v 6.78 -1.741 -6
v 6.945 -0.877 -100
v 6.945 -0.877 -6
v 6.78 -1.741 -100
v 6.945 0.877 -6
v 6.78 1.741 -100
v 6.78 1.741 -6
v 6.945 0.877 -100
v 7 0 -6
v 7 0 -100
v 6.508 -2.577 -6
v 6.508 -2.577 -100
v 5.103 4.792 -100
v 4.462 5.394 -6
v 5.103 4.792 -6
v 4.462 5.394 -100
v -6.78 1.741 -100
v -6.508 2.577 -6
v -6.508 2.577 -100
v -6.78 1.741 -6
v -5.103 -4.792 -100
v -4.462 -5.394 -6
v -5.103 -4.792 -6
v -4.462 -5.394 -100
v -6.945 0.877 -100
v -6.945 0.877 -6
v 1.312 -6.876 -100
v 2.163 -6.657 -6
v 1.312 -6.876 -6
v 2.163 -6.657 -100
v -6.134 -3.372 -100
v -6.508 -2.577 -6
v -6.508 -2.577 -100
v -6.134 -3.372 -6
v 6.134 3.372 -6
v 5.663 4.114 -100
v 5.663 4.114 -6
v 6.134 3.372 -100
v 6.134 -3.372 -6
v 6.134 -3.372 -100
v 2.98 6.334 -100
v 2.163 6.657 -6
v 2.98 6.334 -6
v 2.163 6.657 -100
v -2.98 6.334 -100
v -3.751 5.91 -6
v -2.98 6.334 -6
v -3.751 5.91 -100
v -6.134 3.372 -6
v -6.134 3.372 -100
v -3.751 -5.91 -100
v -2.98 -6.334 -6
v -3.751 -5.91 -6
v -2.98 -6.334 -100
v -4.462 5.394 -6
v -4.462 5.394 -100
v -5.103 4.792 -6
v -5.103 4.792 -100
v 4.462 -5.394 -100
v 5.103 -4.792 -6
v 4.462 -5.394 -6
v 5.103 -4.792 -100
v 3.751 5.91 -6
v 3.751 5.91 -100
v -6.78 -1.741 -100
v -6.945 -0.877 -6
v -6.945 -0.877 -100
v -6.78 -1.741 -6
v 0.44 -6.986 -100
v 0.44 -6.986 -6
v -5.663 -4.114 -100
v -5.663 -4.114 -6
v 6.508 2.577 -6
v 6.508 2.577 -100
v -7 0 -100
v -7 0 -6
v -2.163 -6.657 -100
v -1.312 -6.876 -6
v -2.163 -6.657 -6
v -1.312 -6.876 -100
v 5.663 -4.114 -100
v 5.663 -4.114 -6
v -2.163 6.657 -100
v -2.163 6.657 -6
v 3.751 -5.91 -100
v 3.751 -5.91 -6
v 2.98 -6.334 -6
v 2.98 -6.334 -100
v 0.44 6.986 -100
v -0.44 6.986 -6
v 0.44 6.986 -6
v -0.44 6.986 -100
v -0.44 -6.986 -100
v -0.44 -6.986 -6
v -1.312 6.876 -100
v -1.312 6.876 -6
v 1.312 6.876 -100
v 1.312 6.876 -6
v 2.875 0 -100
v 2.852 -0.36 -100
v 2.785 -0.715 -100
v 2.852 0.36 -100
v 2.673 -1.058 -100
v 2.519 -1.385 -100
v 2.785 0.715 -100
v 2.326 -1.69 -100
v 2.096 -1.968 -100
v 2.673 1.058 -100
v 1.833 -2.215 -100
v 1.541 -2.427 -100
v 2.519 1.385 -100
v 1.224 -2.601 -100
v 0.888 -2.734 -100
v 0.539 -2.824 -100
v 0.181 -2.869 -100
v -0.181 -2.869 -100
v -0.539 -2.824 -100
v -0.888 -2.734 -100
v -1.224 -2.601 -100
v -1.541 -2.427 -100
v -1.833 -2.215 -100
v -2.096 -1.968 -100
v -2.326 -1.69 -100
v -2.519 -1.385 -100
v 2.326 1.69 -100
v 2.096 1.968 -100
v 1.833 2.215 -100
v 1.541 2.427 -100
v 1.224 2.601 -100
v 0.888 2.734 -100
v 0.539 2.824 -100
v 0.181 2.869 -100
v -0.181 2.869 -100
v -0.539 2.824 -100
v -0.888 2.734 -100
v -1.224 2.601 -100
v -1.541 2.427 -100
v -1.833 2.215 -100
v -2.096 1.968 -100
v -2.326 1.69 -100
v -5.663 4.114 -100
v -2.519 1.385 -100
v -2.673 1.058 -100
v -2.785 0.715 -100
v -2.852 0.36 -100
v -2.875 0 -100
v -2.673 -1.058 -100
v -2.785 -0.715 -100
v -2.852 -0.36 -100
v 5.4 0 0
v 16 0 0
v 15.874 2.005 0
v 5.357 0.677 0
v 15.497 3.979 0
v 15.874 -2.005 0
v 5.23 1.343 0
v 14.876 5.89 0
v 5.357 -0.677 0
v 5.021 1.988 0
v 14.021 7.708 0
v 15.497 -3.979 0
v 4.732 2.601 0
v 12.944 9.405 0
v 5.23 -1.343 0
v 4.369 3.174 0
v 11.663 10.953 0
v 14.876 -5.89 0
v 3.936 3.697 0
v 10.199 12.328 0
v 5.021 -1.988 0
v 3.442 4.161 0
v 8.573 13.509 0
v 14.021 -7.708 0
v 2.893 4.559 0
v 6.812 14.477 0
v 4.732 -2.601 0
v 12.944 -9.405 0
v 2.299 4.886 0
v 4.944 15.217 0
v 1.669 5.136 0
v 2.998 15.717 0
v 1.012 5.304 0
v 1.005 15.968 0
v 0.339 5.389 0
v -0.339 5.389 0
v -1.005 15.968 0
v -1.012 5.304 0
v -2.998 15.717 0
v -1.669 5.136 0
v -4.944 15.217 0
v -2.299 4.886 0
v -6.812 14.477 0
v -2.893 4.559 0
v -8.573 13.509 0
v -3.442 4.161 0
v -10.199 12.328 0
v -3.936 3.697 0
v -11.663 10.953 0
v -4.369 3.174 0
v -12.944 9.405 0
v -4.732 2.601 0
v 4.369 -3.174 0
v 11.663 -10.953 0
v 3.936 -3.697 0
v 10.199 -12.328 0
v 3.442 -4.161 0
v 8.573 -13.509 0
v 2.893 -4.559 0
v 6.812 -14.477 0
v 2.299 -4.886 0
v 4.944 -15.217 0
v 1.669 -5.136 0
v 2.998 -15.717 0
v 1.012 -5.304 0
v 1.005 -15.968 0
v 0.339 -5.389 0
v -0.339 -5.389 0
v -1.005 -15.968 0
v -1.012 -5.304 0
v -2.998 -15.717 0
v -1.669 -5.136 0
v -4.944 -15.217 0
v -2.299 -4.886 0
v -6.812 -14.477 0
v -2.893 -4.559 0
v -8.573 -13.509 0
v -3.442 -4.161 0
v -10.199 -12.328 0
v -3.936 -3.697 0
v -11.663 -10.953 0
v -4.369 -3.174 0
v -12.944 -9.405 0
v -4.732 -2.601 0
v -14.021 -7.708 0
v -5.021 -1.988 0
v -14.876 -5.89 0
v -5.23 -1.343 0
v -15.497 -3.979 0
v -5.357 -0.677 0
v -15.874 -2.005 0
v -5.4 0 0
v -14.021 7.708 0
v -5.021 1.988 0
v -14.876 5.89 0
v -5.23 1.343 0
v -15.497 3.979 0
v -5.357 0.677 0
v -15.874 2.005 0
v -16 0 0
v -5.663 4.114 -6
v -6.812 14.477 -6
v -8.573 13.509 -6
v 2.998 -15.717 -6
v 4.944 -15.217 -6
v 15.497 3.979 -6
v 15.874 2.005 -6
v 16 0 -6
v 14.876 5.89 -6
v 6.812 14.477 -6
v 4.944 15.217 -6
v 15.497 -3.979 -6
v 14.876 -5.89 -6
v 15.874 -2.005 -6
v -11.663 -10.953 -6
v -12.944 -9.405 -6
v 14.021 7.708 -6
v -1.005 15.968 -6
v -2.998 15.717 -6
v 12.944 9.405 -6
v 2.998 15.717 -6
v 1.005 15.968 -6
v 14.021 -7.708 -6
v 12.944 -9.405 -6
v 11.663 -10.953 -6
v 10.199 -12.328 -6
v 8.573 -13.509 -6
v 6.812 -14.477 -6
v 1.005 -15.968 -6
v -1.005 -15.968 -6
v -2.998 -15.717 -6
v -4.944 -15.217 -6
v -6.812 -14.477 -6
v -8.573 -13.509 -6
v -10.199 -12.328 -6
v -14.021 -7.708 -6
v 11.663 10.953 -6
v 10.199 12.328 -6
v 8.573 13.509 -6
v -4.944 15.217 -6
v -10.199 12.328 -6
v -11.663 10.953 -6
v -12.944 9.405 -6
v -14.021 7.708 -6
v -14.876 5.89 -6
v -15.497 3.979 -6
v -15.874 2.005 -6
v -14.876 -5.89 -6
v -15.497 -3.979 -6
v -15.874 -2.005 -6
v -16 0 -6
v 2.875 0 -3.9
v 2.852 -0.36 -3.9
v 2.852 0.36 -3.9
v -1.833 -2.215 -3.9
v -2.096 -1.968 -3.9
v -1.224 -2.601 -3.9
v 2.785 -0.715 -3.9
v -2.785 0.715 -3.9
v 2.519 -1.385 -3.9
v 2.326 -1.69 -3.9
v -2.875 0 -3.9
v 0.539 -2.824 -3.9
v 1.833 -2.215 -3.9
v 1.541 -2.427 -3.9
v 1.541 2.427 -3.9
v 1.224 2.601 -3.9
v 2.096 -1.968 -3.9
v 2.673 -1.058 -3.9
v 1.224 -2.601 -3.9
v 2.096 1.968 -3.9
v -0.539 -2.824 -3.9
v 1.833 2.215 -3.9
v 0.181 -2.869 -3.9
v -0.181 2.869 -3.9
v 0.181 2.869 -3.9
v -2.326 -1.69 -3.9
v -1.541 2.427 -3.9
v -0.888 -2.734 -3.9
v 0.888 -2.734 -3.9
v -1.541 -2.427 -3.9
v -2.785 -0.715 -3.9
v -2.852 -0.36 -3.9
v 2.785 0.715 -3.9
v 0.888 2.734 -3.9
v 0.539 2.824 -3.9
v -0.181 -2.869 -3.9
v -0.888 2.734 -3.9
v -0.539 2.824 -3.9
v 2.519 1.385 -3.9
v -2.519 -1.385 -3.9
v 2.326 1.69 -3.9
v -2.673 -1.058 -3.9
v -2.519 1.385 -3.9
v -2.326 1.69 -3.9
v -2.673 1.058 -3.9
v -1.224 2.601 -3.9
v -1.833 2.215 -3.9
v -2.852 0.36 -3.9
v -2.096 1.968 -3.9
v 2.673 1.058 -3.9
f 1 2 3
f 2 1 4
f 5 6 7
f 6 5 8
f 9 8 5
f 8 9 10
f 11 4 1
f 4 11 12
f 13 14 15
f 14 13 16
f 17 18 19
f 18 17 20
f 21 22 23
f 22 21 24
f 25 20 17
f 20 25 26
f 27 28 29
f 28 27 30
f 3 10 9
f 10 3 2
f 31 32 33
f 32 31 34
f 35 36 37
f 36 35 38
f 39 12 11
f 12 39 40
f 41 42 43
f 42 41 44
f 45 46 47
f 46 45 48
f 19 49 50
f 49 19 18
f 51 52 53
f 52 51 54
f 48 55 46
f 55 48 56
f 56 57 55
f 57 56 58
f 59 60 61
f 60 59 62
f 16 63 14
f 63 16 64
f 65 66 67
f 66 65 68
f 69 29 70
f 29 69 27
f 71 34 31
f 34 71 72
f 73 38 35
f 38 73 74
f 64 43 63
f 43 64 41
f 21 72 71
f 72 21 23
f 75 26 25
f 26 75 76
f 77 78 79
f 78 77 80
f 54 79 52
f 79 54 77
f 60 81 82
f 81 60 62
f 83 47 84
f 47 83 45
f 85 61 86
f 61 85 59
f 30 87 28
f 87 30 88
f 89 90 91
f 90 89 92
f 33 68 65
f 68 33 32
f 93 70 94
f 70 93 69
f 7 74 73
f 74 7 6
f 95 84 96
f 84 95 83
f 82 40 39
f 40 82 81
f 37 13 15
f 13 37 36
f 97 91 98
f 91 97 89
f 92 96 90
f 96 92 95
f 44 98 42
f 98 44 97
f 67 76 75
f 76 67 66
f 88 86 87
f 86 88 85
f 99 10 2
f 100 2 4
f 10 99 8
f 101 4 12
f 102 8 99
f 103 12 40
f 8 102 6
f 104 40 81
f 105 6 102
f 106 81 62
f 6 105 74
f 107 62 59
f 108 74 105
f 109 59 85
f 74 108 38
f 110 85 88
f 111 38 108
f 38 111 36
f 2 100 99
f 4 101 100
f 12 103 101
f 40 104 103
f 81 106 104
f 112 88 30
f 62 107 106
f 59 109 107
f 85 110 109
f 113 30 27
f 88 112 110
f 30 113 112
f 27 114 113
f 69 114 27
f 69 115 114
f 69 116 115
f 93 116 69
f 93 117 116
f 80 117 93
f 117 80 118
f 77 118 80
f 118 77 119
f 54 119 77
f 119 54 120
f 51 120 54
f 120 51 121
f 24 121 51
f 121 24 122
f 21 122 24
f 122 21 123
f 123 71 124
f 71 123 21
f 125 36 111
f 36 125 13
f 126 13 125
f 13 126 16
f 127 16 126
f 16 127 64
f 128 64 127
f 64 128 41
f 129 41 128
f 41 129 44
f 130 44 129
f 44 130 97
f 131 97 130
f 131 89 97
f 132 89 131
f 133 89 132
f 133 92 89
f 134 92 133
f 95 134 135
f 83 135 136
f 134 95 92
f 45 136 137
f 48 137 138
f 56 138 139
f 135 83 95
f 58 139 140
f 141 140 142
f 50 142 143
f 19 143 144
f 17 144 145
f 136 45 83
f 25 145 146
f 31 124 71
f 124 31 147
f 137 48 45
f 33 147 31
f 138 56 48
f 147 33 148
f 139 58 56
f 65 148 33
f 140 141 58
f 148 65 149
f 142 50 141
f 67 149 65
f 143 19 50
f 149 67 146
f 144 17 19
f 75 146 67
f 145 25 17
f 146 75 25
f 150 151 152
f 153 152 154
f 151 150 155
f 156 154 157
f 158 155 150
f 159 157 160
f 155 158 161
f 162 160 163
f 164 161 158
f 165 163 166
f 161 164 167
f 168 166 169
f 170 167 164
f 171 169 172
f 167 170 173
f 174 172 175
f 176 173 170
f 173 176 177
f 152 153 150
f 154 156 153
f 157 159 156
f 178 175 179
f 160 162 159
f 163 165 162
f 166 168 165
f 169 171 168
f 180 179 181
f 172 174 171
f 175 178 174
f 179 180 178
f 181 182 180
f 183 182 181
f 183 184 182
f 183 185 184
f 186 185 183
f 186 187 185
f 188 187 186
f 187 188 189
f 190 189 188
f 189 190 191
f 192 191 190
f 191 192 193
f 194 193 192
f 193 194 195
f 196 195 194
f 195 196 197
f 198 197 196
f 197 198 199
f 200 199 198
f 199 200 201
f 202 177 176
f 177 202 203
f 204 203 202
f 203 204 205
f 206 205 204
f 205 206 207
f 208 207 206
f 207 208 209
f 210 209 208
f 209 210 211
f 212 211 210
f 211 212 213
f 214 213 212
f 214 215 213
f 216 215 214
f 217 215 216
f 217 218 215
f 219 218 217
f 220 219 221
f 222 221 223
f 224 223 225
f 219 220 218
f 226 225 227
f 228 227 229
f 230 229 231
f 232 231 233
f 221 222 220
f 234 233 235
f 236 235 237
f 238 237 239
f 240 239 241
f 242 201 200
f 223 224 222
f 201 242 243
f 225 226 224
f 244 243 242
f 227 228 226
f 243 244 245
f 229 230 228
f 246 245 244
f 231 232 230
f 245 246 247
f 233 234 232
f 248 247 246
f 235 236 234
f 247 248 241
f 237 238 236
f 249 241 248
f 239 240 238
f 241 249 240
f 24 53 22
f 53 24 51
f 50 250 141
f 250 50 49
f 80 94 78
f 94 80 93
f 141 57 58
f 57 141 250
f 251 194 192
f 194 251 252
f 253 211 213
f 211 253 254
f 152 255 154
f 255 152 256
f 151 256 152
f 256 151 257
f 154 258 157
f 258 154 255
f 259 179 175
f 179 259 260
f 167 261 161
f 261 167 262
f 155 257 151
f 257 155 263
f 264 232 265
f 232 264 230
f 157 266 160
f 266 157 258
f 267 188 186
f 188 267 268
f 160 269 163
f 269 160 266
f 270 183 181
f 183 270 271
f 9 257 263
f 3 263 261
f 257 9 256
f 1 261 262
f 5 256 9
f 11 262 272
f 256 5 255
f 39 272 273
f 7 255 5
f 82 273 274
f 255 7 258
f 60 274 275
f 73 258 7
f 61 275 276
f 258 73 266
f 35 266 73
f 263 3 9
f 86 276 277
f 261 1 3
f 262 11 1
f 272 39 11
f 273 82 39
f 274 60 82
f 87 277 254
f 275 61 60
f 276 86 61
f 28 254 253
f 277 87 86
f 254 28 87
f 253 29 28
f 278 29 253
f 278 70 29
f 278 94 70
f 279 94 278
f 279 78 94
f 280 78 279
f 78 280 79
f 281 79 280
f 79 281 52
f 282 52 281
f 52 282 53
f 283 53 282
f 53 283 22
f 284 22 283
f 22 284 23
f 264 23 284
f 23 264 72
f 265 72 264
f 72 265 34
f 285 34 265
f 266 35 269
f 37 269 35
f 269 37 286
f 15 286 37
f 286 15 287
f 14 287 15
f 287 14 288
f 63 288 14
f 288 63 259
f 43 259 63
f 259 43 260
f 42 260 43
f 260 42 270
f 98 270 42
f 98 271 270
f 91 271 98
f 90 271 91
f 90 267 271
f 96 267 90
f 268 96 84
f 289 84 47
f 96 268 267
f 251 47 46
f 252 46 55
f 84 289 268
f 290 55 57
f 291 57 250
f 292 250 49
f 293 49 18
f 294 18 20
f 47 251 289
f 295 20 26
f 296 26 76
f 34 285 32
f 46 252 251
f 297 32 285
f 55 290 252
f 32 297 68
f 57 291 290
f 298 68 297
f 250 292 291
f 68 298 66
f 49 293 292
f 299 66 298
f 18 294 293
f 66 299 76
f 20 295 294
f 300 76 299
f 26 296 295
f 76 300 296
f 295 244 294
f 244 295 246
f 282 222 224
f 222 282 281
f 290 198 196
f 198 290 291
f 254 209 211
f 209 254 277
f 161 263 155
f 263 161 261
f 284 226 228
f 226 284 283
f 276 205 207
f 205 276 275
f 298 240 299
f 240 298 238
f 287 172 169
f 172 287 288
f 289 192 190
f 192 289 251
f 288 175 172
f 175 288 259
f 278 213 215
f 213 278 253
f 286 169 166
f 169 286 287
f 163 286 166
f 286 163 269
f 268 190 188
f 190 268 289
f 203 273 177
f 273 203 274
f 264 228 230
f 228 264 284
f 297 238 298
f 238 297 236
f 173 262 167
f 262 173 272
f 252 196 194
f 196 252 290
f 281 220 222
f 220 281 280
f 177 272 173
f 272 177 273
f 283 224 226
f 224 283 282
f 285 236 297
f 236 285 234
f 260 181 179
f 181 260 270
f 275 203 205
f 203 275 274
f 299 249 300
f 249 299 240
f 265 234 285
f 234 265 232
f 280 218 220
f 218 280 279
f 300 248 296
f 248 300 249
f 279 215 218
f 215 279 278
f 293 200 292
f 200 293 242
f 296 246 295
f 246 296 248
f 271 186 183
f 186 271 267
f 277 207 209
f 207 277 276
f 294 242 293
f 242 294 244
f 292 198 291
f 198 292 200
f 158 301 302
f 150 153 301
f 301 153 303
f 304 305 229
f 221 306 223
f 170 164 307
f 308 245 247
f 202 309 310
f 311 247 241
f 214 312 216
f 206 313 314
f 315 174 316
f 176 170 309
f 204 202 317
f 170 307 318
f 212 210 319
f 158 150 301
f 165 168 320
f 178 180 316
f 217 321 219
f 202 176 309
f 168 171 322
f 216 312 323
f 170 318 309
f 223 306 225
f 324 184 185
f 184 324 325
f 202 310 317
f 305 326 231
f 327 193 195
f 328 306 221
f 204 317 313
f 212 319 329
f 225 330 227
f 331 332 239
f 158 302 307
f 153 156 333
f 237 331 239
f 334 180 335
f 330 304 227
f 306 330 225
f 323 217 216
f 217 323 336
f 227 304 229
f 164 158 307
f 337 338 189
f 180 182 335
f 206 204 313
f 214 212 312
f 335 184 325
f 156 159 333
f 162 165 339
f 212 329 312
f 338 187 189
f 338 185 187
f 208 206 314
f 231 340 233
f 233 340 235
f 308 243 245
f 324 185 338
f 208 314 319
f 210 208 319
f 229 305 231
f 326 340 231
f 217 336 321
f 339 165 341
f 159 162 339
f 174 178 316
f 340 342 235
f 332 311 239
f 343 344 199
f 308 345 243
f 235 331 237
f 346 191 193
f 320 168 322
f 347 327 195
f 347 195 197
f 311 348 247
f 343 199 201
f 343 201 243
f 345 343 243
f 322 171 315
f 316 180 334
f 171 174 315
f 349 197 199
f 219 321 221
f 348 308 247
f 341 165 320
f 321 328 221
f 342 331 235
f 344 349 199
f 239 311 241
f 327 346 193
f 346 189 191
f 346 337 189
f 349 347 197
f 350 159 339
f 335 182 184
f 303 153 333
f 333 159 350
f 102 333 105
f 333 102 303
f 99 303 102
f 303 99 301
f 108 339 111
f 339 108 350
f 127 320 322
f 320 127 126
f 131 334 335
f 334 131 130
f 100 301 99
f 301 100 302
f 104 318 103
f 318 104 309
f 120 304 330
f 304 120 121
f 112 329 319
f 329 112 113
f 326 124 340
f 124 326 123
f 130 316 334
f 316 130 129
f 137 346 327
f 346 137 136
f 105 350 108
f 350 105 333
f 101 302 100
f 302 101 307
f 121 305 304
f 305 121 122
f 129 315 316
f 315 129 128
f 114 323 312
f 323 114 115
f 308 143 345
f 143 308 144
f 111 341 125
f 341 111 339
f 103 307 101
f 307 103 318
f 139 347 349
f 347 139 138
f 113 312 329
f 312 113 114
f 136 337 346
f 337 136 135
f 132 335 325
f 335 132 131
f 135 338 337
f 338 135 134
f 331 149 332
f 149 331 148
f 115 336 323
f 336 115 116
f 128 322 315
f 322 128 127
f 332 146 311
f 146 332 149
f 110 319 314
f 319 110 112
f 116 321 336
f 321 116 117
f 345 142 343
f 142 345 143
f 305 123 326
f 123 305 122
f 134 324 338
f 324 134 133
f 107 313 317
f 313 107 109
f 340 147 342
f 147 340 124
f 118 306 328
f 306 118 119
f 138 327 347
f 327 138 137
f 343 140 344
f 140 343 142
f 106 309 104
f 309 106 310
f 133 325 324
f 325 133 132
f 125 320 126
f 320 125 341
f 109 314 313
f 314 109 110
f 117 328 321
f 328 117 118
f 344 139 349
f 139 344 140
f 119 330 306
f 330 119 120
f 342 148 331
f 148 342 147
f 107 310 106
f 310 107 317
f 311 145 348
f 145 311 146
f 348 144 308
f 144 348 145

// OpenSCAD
$fn = 50;


difference() {
	union() {
		translate(v = [0, 0, -100.0000000000]) {
			cylinder(h = 100, r = 7.0000000000);
		}
		translate(v = [0, 0, -6.0000000000]) {
			cylinder(h = 6, r = 16.0000000000);
		}
	}
	union() {
		translate(v = [0, 0, 0]) {
			rotate(a = [0, 0, 0]) {
				difference() {
					union() {
						#translate(v = [0, 0, -100.0000000000]) {
							cylinder(h = 100, r = 2.6000000000);
						}
						#translate(v = [0, 0, -3.9000000000]) {
							cylinder(h = 3.9000000000, r = 7.0000000000, r1 = 2.8750000000, r2 = 5.4000000000);
						}
						#translate(v = [0, 0, -100.0000000000]) {
							cylinder(h = 100, r = 2.8750000000);
						}
						#translate(v = [0, 0, -100.0000000000]) {
							cylinder(h = 100, r = 2.6000000000);
						}
					}
					union();
				}
			}
		}
	}
}
